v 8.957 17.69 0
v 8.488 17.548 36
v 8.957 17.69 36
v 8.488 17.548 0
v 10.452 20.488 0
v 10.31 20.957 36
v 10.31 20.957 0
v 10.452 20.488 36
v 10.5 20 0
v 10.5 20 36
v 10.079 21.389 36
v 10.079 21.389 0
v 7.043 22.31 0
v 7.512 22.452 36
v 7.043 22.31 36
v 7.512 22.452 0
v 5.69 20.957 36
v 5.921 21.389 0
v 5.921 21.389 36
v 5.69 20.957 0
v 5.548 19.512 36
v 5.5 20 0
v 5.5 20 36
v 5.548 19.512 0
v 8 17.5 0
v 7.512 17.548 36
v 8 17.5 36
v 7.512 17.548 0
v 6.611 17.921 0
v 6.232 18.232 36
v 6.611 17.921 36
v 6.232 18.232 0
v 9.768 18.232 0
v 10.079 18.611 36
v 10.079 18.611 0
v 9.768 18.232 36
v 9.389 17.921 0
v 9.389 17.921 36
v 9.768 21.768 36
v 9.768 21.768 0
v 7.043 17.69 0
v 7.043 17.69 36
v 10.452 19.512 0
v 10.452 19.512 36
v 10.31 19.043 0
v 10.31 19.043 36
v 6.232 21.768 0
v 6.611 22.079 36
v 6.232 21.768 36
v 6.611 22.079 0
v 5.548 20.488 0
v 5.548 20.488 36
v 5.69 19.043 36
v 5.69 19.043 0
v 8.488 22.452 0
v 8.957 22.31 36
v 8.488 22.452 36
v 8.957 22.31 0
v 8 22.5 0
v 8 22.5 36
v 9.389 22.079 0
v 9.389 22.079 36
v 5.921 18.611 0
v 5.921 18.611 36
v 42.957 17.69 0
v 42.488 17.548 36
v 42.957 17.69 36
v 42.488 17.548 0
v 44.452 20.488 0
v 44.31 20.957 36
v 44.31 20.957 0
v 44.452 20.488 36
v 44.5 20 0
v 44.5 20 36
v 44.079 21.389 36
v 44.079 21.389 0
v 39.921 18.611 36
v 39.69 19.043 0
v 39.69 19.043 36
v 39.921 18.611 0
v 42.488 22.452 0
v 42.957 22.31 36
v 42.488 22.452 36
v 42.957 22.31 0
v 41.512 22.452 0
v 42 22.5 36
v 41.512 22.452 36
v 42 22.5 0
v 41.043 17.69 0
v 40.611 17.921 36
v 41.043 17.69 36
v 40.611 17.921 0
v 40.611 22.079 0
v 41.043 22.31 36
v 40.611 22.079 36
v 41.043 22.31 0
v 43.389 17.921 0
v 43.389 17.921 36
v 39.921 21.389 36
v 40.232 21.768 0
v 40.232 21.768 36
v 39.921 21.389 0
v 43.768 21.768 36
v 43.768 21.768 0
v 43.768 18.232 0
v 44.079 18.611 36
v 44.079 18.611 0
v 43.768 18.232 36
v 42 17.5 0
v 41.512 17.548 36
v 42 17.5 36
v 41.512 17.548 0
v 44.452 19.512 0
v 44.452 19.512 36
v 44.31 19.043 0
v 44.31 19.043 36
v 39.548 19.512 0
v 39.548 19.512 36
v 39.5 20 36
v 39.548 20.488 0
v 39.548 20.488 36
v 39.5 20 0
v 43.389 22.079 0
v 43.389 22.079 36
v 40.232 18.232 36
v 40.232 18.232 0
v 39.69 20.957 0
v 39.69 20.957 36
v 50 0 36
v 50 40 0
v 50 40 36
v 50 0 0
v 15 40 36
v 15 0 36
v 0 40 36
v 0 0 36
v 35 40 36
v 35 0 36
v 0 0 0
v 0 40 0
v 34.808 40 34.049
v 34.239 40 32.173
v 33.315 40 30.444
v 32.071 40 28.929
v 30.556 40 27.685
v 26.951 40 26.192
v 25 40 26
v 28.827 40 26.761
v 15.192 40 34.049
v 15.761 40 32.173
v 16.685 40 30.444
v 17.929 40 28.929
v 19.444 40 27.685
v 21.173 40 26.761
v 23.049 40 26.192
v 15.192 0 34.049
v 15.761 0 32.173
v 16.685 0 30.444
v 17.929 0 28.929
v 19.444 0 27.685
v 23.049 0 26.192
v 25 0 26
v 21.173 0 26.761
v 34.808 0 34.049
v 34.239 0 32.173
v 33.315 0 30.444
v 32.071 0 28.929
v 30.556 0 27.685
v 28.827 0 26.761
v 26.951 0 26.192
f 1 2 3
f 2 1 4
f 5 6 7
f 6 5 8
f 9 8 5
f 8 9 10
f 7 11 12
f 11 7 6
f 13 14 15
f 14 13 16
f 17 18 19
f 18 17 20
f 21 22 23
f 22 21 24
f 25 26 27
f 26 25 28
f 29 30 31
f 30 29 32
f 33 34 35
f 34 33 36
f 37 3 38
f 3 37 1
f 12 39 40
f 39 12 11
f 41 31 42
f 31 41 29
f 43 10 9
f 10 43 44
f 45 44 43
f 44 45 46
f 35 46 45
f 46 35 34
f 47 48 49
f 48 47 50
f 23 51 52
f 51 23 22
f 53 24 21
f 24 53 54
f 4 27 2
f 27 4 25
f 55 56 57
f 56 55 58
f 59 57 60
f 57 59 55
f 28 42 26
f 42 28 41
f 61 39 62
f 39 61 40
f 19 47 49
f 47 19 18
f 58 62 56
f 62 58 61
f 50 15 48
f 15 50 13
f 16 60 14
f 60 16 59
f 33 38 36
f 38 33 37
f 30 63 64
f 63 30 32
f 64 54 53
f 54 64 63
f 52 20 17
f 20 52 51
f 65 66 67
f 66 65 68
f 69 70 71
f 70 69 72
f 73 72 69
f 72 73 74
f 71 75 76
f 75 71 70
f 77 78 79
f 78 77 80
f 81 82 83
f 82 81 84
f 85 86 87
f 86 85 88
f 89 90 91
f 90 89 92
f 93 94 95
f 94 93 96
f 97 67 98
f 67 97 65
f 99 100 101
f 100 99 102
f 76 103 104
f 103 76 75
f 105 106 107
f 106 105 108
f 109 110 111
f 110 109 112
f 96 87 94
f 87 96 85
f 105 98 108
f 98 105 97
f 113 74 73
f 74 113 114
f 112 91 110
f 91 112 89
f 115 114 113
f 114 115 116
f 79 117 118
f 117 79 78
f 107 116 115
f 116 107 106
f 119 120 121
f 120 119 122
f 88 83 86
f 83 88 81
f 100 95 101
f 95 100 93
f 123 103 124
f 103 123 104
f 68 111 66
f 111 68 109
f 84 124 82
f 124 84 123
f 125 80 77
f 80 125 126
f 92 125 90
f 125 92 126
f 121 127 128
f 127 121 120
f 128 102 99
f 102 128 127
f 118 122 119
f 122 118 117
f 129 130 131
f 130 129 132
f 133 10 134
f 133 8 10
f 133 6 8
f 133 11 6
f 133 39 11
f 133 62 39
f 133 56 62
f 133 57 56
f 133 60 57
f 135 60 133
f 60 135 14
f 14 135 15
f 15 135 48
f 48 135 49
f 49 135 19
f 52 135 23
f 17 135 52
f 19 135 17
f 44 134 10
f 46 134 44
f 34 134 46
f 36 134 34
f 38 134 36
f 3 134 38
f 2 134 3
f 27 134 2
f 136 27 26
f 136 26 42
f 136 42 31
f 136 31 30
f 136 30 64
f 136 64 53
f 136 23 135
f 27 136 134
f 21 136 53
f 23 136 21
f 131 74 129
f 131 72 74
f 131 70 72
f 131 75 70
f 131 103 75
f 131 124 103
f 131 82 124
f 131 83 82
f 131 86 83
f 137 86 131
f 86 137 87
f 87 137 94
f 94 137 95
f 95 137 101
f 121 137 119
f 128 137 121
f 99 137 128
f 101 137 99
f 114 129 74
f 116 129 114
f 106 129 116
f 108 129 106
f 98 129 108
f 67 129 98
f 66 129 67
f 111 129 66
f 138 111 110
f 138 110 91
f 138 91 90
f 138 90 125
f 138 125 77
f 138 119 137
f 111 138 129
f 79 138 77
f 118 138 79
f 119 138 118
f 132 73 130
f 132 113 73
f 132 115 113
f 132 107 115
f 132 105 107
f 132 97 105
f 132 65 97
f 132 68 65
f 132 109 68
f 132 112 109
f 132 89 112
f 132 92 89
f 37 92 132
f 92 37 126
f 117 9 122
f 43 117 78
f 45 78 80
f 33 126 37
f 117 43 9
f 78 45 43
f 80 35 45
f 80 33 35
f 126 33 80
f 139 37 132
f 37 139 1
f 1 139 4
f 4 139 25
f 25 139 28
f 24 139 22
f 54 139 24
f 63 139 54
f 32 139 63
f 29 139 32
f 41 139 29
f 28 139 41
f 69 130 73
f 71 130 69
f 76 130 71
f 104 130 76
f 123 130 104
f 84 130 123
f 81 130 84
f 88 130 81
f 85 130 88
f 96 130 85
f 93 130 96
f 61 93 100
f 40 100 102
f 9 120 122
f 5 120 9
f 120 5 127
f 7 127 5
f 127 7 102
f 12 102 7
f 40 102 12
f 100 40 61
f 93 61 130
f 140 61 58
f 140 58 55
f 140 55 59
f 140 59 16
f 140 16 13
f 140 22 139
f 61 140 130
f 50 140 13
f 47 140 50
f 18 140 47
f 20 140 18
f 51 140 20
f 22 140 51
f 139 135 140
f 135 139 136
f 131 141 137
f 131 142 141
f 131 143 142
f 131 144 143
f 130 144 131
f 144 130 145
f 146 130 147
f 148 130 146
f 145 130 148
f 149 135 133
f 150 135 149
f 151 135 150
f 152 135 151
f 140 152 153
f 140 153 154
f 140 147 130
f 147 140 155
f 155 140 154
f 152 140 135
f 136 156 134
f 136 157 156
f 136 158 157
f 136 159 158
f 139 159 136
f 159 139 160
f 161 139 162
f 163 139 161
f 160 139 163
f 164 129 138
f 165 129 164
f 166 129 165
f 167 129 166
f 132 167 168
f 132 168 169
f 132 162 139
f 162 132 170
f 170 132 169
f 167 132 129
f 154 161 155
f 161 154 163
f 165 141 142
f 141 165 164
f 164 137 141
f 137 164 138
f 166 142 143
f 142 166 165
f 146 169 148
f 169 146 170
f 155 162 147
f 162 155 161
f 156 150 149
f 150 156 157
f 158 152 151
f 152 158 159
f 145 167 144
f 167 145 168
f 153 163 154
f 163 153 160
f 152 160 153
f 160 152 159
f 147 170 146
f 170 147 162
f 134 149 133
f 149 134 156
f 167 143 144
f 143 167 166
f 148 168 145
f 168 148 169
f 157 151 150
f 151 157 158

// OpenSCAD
$fn = 32;

// ----------------------------------------------------------------------
// Saddle clamp: plain shaft clamp
// ----------------------------------------------------------------------

// --- parameters (mm) ---
blk_l = 50;               // block length, X
blk_w = 40;               // block width, Y
blk_h = 36;               // block height
clamp_r = 10;             // shaft groove radius
hole_r = 2.5;             // bolt hole radius
hole_m = 8;               // bolt hole margin from the ends

saw_depth = clamp_r + 3;  // saw kerf depth

difference() {
  cube([blk_l, blk_w, blk_h]);
  translate([blk_l / 2, -1, blk_h])
    rotate([-90, 0, 0])
      cylinder(h = blk_w + 2, r = clamp_r);
  for (sx = [0, 1])
    translate([sx ? blk_l - hole_m : hole_m, blk_w / 2, -1])
      cylinder(r = hole_r, h = blk_h + 2);
}
